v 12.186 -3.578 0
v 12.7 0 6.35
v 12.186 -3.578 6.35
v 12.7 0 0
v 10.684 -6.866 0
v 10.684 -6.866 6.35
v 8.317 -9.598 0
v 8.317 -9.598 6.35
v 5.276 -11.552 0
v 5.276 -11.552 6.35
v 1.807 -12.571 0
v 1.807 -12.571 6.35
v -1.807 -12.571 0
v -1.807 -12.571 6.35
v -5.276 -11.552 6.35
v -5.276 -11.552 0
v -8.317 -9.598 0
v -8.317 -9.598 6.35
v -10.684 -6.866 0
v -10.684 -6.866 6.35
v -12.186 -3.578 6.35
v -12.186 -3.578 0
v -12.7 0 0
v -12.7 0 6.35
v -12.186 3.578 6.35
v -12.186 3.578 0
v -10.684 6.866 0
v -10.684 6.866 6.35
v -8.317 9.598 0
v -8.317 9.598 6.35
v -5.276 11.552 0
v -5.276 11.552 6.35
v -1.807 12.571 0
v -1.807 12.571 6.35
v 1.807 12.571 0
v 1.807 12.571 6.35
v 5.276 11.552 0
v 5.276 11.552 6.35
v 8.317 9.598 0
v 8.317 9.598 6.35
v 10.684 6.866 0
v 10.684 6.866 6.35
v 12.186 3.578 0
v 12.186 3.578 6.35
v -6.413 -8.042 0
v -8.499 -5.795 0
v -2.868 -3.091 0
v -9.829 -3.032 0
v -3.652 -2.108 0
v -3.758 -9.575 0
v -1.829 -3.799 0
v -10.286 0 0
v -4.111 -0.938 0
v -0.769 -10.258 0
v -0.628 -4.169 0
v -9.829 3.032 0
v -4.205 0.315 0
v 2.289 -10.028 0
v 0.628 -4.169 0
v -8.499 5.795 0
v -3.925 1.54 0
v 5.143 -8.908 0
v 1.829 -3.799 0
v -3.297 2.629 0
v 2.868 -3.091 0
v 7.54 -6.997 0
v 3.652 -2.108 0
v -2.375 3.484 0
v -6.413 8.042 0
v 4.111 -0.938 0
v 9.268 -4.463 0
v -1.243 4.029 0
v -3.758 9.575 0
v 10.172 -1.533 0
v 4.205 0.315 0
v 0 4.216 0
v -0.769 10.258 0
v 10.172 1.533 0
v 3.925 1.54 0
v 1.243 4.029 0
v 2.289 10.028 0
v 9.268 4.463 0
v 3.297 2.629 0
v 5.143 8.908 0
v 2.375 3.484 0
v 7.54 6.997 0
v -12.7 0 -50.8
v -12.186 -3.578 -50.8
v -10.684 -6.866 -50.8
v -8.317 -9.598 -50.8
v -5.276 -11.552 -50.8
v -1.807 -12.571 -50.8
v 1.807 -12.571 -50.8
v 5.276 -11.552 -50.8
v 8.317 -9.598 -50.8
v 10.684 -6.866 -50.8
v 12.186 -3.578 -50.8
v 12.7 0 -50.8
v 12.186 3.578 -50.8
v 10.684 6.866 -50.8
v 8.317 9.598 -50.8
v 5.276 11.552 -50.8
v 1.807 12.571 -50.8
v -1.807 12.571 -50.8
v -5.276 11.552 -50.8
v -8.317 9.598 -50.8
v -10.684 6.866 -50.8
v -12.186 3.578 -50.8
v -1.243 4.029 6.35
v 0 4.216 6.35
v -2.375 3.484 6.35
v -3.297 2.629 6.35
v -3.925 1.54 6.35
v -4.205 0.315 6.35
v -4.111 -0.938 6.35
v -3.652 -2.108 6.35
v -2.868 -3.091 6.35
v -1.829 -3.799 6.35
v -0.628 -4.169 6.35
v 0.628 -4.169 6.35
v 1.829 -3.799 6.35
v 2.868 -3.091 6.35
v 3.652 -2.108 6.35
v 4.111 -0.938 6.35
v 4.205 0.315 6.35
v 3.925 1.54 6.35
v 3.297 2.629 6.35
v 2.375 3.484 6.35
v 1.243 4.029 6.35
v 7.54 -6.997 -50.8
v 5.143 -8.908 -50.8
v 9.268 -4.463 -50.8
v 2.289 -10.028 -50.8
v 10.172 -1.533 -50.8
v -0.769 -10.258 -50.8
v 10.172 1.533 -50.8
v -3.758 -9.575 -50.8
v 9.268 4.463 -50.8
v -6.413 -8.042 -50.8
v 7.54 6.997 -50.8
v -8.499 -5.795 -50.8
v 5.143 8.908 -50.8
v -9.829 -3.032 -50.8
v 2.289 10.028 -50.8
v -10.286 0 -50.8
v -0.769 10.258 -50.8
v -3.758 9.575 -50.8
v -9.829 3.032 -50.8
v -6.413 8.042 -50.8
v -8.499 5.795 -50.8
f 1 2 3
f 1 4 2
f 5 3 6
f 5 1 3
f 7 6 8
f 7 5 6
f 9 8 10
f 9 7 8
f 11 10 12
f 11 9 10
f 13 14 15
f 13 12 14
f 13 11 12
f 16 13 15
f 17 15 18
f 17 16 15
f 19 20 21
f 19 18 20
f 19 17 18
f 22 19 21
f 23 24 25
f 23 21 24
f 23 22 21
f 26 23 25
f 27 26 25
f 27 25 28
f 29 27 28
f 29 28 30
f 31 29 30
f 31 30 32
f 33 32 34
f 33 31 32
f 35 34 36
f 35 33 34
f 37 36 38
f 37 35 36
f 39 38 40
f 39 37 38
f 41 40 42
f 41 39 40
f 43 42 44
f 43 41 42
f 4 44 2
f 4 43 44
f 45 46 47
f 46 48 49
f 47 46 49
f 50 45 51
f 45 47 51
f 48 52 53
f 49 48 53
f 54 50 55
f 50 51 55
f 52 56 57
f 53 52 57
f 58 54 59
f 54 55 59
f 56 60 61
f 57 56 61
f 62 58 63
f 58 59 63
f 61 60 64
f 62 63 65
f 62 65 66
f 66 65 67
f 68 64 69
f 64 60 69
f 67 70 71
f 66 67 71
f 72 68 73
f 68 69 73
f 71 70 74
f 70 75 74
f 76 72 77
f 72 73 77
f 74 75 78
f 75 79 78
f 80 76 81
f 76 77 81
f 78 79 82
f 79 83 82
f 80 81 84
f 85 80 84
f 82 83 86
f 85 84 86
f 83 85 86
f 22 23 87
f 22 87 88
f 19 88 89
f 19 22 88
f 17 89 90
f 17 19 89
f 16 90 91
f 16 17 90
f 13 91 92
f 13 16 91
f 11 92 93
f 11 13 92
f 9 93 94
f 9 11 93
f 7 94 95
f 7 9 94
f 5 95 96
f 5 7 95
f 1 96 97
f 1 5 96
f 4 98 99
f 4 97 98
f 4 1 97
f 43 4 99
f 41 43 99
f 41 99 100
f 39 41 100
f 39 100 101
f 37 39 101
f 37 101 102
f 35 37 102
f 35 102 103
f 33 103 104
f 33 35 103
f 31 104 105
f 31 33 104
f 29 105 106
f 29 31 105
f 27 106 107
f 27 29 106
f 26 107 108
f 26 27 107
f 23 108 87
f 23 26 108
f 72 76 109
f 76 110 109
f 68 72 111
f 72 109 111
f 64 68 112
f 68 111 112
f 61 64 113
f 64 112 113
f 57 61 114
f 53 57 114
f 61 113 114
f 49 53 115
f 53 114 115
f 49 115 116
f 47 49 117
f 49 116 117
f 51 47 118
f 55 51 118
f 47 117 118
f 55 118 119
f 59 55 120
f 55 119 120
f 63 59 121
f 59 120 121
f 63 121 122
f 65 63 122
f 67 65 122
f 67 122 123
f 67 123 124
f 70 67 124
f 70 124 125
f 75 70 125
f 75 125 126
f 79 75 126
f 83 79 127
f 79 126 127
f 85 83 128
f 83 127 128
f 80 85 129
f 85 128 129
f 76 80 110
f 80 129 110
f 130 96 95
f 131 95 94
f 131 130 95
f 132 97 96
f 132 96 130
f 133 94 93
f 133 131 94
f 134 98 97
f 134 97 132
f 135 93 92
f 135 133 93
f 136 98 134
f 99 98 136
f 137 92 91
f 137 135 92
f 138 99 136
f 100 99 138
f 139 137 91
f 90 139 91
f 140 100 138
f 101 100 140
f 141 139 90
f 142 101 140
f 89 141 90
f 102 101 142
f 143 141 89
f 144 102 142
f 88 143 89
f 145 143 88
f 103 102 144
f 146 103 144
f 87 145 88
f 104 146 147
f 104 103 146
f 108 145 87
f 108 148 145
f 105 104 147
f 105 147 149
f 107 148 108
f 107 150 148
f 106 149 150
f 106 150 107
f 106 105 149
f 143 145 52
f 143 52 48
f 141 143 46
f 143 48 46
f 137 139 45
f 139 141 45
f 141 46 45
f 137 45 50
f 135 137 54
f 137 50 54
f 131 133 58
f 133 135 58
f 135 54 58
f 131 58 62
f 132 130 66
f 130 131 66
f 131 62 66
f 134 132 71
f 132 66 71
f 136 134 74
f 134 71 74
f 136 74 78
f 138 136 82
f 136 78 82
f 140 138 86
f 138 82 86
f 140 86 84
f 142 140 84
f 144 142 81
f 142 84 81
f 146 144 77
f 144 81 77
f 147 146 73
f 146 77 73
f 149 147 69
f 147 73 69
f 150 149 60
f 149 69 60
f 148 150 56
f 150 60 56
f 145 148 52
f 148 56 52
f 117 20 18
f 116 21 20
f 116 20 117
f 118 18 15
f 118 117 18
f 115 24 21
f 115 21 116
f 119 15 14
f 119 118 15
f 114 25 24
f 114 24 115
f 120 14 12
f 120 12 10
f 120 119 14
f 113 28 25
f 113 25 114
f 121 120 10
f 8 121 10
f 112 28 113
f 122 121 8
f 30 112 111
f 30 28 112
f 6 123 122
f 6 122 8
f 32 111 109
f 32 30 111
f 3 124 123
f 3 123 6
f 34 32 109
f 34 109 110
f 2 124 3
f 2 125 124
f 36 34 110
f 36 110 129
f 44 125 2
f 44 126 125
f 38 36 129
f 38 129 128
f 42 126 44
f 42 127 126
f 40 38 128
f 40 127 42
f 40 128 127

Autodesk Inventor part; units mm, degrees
ref_plane "YZ Plane" through (0, 0, 0) normal (1, 0, 0) x (0, 1, 0)
ref_plane "XZ Plane" through (0, 0, 0) normal (0, 1, 0) x (-1, 0, 0)
ref_plane "XY Plane" through (0, 0, 0) normal (0, 0, 1) x (1, 0, 0)
sketch "Sketch1" plane through (0, 0, 0) normal (0, 0, 1) x (1, 0, 0)
  circle A0 centre (0, 0) radius 12.7
  dimension "d0" = 25.4
extrude "Extrusion1" add sketch "Sketch1" along normal blind 6.35
sketch "Sketch2" plane through (0, 0, 0) normal (0, 0, -1) x (-1, 0, 0)
  point P0 (0, 0)
  point P1 (0, 0)
hole "Hole1" at (0, 0, 0) direction (0, 0, 1) diameter 8.4328 end through all clearance for "Flat Head Machine Screw (82)" size "5/16" standard "Ansi Unified Screw Threads"
sketch "Sketch3" plane through (0, 0, 0) normal (0, 0, -1) x (-1, 0, 0)
  circle A0 centre (0, 0) radius 12.7
  circle A1 centre (0, 0) radius 12.7 projected
  circle A2 centre (0, 0) radius 10.2864
  dimension "d10" = 20.5728
  dimension "d11" = 25.4
extrude "Extrusion2" add sketch "Sketch3" along normal blind 50.8
properties part number "topForDart"
